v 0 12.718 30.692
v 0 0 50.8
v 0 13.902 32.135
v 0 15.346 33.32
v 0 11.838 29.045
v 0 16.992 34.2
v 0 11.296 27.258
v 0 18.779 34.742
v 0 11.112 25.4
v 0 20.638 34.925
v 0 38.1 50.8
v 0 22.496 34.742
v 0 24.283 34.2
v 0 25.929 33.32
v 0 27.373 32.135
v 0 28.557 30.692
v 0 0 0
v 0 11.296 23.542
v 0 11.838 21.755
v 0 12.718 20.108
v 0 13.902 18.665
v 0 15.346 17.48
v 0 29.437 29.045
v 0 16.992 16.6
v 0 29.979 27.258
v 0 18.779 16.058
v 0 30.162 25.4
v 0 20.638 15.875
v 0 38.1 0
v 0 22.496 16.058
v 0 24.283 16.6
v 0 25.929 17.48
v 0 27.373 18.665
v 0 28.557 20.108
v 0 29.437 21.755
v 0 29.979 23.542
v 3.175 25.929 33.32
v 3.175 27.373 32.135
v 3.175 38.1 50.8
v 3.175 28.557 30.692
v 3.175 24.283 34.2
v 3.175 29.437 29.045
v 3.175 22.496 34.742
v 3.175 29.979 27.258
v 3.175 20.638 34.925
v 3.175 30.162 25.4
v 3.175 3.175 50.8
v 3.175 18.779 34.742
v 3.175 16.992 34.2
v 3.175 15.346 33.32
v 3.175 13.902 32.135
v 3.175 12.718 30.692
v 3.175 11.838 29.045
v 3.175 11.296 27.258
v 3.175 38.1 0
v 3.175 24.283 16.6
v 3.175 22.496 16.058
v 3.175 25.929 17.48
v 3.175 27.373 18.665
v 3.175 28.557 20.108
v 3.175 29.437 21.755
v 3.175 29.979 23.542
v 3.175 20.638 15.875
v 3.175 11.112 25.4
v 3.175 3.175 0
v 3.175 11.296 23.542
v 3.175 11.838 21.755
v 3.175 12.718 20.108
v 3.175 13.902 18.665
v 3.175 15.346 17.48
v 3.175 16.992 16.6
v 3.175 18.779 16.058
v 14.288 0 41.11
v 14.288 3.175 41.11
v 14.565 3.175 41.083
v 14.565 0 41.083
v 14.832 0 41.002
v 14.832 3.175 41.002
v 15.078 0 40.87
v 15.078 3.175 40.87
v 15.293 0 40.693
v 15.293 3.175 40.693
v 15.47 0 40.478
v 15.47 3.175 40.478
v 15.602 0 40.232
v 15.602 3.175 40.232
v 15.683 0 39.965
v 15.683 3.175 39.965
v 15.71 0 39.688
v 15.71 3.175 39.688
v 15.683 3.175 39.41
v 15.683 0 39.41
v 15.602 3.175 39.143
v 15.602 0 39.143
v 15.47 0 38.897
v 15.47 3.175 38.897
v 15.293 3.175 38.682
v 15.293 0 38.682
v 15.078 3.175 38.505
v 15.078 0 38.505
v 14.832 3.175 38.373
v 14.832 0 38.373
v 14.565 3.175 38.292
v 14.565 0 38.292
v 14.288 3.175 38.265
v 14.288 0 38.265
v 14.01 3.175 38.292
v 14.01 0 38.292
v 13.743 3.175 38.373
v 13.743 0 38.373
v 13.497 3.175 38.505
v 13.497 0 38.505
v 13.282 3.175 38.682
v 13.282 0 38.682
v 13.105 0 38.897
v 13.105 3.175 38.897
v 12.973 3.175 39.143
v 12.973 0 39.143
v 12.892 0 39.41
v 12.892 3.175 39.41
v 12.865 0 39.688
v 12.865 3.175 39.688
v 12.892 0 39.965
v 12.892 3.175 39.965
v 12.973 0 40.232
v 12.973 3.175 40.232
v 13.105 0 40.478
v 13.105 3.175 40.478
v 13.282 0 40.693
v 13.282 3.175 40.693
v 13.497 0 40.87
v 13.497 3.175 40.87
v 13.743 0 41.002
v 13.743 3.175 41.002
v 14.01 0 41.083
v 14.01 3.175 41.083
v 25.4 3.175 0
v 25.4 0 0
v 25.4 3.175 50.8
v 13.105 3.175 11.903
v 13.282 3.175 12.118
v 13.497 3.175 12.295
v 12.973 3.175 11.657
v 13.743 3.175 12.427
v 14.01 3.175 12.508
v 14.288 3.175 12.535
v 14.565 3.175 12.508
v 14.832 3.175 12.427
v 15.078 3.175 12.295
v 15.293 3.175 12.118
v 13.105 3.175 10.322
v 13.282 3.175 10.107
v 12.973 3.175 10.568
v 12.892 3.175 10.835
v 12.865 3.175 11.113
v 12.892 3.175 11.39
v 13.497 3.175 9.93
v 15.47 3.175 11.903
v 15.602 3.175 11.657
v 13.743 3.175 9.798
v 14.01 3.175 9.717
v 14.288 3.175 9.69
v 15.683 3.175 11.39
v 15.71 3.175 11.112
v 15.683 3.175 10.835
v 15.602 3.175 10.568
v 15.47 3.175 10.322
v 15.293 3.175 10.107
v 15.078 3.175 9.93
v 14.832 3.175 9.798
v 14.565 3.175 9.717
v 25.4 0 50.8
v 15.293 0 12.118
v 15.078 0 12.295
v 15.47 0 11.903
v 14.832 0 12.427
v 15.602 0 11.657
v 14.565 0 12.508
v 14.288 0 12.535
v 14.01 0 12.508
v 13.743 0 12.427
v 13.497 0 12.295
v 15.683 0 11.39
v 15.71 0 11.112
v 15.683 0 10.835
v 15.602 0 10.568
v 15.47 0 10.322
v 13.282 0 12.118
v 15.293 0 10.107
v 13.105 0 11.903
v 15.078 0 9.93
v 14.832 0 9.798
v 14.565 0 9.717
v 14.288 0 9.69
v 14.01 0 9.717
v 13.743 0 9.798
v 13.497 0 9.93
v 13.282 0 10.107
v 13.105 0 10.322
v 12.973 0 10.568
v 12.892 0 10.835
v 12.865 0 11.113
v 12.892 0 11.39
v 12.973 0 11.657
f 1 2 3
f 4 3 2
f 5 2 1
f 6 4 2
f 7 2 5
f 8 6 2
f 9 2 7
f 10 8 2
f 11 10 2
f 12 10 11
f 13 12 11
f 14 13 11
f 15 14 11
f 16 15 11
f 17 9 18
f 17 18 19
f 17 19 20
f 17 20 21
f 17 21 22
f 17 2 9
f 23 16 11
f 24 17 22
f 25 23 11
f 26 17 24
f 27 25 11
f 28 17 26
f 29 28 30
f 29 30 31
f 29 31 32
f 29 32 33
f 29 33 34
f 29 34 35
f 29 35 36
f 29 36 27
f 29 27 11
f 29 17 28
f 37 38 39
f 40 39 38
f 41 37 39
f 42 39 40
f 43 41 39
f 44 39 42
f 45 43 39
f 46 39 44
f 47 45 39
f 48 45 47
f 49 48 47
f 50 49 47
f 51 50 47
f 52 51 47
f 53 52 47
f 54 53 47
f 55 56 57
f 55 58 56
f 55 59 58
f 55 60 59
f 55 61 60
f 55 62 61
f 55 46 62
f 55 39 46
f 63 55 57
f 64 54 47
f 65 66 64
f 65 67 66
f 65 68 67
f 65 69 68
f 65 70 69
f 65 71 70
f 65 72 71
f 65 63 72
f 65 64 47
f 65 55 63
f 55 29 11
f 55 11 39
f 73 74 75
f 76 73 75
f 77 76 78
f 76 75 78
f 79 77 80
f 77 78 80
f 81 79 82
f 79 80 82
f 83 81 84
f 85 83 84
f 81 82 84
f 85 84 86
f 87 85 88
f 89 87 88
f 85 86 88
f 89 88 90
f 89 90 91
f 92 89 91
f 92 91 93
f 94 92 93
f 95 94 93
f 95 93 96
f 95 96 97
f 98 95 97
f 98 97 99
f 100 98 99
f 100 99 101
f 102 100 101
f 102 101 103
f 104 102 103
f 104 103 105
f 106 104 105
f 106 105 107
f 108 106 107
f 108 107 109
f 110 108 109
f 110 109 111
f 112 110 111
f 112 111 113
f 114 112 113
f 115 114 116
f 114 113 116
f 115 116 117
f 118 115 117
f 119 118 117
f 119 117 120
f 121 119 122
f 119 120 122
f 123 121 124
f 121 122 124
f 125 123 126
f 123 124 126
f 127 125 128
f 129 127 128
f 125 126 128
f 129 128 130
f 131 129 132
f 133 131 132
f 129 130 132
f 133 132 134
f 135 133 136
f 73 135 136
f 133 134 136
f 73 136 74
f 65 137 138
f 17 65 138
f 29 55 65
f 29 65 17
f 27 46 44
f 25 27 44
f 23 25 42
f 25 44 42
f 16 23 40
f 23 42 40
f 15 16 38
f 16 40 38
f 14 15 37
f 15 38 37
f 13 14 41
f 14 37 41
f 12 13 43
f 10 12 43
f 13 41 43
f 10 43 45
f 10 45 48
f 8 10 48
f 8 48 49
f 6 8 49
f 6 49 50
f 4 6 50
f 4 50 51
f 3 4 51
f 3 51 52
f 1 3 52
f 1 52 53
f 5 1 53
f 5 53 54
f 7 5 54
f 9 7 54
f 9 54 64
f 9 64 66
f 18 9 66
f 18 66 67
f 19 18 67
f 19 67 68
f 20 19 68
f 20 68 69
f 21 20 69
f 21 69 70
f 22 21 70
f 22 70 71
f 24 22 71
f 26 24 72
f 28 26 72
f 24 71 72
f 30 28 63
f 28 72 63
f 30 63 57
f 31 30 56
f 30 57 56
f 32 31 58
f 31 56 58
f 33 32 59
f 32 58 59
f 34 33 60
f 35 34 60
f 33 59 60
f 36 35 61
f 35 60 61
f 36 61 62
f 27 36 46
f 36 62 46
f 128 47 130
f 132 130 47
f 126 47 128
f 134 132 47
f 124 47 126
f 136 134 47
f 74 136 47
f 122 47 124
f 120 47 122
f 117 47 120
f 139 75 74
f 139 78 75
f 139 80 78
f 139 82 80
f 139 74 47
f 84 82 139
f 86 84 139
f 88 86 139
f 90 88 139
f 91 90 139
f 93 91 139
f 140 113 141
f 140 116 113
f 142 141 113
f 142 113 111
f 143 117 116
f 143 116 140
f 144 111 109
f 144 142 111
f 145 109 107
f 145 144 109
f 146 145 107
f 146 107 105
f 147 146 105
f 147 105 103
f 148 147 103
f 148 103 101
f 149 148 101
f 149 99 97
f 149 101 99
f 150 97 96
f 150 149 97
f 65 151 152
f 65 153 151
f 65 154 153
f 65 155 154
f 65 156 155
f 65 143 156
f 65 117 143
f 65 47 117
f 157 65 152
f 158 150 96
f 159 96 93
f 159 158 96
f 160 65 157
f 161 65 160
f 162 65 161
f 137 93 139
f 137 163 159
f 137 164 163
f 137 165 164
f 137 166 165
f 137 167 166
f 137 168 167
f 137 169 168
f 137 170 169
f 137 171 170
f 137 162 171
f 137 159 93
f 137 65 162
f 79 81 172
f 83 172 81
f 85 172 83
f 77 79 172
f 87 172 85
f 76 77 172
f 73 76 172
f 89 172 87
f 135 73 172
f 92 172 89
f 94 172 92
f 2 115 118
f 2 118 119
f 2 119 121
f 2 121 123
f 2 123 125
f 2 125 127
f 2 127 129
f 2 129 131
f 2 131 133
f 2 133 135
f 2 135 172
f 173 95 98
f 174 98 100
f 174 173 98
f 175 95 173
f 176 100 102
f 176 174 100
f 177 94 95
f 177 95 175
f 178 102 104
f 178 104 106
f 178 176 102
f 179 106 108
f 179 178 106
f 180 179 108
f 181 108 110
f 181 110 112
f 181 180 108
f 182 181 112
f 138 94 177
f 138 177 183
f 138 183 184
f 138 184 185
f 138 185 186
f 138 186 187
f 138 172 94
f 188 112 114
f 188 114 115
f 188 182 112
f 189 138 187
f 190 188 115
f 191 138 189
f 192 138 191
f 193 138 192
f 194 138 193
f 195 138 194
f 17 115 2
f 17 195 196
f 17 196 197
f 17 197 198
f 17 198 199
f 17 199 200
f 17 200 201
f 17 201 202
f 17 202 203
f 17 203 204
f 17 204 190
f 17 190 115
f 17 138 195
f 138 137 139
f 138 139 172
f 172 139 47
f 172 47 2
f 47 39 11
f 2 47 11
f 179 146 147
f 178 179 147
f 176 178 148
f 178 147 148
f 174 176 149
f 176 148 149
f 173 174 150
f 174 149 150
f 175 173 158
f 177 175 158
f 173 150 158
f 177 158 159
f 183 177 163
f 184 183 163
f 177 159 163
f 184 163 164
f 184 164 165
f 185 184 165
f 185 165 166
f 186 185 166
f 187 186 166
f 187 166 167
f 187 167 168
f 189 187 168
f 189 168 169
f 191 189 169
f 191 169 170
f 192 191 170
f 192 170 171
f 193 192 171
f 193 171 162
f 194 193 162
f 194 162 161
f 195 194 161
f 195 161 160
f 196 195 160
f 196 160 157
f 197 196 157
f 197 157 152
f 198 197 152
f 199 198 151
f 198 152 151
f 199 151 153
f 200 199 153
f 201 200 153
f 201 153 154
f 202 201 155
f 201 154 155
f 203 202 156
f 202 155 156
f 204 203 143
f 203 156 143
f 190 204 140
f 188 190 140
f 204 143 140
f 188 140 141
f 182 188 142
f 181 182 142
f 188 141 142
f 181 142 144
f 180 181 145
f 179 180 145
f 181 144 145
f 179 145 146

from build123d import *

# Parameters (mm, degrees)
BOSS_EXTRUDE1_DEPTH = 50.8
SKETCH2_R           = 9.525
CUT_EXTRUDE1_DEPTH  = 50.8
SKETCH3_R           = 1.4224
CUT_EXTRUDE2_DEPTH  = 67.675


with BuildPart() as part:
    # Sketch1 → Boss-Extrude1 (new body)
    with BuildSketch(Plane.XY):
        Polygon((25.4, 0), (0, 0), (0, 38.1), (3.175, 38.1), (3.175, 3.175), (25.4, 3.175), align=None)
    extrude(amount=BOSS_EXTRUDE1_DEPTH)

    # Sketch2 → Cut-Extrude1 (cut)
    with BuildSketch(Plane(origin=(3.175, 0, 0), x_dir=(0, 0, -1), z_dir=(1, 0, 0))):
        with Locations(Location((-25.4, 20.6375, 0), (0, 0, 90))):
            Circle(SKETCH2_R)
    extrude(amount=-CUT_EXTRUDE1_DEPTH, mode=Mode.SUBTRACT)

    # Sketch3 → Cut-Extrude2 (cut, through all)
    with BuildSketch(Plane(origin=(0, 3.175, 0), x_dir=(1, 0, 0), z_dir=(0, 1, 0))):
        with Locations(Location((14.2875, -11.1125, 0), (0, 0, 270))):
            Circle(SKETCH3_R)
        with Locations(Location((14.2875, -39.6875, 0), (0, 0, 270))):
            Circle(SKETCH3_R)
    extrude(amount=-CUT_EXTRUDE2_DEPTH, mode=Mode.SUBTRACT)


solid = part.part
